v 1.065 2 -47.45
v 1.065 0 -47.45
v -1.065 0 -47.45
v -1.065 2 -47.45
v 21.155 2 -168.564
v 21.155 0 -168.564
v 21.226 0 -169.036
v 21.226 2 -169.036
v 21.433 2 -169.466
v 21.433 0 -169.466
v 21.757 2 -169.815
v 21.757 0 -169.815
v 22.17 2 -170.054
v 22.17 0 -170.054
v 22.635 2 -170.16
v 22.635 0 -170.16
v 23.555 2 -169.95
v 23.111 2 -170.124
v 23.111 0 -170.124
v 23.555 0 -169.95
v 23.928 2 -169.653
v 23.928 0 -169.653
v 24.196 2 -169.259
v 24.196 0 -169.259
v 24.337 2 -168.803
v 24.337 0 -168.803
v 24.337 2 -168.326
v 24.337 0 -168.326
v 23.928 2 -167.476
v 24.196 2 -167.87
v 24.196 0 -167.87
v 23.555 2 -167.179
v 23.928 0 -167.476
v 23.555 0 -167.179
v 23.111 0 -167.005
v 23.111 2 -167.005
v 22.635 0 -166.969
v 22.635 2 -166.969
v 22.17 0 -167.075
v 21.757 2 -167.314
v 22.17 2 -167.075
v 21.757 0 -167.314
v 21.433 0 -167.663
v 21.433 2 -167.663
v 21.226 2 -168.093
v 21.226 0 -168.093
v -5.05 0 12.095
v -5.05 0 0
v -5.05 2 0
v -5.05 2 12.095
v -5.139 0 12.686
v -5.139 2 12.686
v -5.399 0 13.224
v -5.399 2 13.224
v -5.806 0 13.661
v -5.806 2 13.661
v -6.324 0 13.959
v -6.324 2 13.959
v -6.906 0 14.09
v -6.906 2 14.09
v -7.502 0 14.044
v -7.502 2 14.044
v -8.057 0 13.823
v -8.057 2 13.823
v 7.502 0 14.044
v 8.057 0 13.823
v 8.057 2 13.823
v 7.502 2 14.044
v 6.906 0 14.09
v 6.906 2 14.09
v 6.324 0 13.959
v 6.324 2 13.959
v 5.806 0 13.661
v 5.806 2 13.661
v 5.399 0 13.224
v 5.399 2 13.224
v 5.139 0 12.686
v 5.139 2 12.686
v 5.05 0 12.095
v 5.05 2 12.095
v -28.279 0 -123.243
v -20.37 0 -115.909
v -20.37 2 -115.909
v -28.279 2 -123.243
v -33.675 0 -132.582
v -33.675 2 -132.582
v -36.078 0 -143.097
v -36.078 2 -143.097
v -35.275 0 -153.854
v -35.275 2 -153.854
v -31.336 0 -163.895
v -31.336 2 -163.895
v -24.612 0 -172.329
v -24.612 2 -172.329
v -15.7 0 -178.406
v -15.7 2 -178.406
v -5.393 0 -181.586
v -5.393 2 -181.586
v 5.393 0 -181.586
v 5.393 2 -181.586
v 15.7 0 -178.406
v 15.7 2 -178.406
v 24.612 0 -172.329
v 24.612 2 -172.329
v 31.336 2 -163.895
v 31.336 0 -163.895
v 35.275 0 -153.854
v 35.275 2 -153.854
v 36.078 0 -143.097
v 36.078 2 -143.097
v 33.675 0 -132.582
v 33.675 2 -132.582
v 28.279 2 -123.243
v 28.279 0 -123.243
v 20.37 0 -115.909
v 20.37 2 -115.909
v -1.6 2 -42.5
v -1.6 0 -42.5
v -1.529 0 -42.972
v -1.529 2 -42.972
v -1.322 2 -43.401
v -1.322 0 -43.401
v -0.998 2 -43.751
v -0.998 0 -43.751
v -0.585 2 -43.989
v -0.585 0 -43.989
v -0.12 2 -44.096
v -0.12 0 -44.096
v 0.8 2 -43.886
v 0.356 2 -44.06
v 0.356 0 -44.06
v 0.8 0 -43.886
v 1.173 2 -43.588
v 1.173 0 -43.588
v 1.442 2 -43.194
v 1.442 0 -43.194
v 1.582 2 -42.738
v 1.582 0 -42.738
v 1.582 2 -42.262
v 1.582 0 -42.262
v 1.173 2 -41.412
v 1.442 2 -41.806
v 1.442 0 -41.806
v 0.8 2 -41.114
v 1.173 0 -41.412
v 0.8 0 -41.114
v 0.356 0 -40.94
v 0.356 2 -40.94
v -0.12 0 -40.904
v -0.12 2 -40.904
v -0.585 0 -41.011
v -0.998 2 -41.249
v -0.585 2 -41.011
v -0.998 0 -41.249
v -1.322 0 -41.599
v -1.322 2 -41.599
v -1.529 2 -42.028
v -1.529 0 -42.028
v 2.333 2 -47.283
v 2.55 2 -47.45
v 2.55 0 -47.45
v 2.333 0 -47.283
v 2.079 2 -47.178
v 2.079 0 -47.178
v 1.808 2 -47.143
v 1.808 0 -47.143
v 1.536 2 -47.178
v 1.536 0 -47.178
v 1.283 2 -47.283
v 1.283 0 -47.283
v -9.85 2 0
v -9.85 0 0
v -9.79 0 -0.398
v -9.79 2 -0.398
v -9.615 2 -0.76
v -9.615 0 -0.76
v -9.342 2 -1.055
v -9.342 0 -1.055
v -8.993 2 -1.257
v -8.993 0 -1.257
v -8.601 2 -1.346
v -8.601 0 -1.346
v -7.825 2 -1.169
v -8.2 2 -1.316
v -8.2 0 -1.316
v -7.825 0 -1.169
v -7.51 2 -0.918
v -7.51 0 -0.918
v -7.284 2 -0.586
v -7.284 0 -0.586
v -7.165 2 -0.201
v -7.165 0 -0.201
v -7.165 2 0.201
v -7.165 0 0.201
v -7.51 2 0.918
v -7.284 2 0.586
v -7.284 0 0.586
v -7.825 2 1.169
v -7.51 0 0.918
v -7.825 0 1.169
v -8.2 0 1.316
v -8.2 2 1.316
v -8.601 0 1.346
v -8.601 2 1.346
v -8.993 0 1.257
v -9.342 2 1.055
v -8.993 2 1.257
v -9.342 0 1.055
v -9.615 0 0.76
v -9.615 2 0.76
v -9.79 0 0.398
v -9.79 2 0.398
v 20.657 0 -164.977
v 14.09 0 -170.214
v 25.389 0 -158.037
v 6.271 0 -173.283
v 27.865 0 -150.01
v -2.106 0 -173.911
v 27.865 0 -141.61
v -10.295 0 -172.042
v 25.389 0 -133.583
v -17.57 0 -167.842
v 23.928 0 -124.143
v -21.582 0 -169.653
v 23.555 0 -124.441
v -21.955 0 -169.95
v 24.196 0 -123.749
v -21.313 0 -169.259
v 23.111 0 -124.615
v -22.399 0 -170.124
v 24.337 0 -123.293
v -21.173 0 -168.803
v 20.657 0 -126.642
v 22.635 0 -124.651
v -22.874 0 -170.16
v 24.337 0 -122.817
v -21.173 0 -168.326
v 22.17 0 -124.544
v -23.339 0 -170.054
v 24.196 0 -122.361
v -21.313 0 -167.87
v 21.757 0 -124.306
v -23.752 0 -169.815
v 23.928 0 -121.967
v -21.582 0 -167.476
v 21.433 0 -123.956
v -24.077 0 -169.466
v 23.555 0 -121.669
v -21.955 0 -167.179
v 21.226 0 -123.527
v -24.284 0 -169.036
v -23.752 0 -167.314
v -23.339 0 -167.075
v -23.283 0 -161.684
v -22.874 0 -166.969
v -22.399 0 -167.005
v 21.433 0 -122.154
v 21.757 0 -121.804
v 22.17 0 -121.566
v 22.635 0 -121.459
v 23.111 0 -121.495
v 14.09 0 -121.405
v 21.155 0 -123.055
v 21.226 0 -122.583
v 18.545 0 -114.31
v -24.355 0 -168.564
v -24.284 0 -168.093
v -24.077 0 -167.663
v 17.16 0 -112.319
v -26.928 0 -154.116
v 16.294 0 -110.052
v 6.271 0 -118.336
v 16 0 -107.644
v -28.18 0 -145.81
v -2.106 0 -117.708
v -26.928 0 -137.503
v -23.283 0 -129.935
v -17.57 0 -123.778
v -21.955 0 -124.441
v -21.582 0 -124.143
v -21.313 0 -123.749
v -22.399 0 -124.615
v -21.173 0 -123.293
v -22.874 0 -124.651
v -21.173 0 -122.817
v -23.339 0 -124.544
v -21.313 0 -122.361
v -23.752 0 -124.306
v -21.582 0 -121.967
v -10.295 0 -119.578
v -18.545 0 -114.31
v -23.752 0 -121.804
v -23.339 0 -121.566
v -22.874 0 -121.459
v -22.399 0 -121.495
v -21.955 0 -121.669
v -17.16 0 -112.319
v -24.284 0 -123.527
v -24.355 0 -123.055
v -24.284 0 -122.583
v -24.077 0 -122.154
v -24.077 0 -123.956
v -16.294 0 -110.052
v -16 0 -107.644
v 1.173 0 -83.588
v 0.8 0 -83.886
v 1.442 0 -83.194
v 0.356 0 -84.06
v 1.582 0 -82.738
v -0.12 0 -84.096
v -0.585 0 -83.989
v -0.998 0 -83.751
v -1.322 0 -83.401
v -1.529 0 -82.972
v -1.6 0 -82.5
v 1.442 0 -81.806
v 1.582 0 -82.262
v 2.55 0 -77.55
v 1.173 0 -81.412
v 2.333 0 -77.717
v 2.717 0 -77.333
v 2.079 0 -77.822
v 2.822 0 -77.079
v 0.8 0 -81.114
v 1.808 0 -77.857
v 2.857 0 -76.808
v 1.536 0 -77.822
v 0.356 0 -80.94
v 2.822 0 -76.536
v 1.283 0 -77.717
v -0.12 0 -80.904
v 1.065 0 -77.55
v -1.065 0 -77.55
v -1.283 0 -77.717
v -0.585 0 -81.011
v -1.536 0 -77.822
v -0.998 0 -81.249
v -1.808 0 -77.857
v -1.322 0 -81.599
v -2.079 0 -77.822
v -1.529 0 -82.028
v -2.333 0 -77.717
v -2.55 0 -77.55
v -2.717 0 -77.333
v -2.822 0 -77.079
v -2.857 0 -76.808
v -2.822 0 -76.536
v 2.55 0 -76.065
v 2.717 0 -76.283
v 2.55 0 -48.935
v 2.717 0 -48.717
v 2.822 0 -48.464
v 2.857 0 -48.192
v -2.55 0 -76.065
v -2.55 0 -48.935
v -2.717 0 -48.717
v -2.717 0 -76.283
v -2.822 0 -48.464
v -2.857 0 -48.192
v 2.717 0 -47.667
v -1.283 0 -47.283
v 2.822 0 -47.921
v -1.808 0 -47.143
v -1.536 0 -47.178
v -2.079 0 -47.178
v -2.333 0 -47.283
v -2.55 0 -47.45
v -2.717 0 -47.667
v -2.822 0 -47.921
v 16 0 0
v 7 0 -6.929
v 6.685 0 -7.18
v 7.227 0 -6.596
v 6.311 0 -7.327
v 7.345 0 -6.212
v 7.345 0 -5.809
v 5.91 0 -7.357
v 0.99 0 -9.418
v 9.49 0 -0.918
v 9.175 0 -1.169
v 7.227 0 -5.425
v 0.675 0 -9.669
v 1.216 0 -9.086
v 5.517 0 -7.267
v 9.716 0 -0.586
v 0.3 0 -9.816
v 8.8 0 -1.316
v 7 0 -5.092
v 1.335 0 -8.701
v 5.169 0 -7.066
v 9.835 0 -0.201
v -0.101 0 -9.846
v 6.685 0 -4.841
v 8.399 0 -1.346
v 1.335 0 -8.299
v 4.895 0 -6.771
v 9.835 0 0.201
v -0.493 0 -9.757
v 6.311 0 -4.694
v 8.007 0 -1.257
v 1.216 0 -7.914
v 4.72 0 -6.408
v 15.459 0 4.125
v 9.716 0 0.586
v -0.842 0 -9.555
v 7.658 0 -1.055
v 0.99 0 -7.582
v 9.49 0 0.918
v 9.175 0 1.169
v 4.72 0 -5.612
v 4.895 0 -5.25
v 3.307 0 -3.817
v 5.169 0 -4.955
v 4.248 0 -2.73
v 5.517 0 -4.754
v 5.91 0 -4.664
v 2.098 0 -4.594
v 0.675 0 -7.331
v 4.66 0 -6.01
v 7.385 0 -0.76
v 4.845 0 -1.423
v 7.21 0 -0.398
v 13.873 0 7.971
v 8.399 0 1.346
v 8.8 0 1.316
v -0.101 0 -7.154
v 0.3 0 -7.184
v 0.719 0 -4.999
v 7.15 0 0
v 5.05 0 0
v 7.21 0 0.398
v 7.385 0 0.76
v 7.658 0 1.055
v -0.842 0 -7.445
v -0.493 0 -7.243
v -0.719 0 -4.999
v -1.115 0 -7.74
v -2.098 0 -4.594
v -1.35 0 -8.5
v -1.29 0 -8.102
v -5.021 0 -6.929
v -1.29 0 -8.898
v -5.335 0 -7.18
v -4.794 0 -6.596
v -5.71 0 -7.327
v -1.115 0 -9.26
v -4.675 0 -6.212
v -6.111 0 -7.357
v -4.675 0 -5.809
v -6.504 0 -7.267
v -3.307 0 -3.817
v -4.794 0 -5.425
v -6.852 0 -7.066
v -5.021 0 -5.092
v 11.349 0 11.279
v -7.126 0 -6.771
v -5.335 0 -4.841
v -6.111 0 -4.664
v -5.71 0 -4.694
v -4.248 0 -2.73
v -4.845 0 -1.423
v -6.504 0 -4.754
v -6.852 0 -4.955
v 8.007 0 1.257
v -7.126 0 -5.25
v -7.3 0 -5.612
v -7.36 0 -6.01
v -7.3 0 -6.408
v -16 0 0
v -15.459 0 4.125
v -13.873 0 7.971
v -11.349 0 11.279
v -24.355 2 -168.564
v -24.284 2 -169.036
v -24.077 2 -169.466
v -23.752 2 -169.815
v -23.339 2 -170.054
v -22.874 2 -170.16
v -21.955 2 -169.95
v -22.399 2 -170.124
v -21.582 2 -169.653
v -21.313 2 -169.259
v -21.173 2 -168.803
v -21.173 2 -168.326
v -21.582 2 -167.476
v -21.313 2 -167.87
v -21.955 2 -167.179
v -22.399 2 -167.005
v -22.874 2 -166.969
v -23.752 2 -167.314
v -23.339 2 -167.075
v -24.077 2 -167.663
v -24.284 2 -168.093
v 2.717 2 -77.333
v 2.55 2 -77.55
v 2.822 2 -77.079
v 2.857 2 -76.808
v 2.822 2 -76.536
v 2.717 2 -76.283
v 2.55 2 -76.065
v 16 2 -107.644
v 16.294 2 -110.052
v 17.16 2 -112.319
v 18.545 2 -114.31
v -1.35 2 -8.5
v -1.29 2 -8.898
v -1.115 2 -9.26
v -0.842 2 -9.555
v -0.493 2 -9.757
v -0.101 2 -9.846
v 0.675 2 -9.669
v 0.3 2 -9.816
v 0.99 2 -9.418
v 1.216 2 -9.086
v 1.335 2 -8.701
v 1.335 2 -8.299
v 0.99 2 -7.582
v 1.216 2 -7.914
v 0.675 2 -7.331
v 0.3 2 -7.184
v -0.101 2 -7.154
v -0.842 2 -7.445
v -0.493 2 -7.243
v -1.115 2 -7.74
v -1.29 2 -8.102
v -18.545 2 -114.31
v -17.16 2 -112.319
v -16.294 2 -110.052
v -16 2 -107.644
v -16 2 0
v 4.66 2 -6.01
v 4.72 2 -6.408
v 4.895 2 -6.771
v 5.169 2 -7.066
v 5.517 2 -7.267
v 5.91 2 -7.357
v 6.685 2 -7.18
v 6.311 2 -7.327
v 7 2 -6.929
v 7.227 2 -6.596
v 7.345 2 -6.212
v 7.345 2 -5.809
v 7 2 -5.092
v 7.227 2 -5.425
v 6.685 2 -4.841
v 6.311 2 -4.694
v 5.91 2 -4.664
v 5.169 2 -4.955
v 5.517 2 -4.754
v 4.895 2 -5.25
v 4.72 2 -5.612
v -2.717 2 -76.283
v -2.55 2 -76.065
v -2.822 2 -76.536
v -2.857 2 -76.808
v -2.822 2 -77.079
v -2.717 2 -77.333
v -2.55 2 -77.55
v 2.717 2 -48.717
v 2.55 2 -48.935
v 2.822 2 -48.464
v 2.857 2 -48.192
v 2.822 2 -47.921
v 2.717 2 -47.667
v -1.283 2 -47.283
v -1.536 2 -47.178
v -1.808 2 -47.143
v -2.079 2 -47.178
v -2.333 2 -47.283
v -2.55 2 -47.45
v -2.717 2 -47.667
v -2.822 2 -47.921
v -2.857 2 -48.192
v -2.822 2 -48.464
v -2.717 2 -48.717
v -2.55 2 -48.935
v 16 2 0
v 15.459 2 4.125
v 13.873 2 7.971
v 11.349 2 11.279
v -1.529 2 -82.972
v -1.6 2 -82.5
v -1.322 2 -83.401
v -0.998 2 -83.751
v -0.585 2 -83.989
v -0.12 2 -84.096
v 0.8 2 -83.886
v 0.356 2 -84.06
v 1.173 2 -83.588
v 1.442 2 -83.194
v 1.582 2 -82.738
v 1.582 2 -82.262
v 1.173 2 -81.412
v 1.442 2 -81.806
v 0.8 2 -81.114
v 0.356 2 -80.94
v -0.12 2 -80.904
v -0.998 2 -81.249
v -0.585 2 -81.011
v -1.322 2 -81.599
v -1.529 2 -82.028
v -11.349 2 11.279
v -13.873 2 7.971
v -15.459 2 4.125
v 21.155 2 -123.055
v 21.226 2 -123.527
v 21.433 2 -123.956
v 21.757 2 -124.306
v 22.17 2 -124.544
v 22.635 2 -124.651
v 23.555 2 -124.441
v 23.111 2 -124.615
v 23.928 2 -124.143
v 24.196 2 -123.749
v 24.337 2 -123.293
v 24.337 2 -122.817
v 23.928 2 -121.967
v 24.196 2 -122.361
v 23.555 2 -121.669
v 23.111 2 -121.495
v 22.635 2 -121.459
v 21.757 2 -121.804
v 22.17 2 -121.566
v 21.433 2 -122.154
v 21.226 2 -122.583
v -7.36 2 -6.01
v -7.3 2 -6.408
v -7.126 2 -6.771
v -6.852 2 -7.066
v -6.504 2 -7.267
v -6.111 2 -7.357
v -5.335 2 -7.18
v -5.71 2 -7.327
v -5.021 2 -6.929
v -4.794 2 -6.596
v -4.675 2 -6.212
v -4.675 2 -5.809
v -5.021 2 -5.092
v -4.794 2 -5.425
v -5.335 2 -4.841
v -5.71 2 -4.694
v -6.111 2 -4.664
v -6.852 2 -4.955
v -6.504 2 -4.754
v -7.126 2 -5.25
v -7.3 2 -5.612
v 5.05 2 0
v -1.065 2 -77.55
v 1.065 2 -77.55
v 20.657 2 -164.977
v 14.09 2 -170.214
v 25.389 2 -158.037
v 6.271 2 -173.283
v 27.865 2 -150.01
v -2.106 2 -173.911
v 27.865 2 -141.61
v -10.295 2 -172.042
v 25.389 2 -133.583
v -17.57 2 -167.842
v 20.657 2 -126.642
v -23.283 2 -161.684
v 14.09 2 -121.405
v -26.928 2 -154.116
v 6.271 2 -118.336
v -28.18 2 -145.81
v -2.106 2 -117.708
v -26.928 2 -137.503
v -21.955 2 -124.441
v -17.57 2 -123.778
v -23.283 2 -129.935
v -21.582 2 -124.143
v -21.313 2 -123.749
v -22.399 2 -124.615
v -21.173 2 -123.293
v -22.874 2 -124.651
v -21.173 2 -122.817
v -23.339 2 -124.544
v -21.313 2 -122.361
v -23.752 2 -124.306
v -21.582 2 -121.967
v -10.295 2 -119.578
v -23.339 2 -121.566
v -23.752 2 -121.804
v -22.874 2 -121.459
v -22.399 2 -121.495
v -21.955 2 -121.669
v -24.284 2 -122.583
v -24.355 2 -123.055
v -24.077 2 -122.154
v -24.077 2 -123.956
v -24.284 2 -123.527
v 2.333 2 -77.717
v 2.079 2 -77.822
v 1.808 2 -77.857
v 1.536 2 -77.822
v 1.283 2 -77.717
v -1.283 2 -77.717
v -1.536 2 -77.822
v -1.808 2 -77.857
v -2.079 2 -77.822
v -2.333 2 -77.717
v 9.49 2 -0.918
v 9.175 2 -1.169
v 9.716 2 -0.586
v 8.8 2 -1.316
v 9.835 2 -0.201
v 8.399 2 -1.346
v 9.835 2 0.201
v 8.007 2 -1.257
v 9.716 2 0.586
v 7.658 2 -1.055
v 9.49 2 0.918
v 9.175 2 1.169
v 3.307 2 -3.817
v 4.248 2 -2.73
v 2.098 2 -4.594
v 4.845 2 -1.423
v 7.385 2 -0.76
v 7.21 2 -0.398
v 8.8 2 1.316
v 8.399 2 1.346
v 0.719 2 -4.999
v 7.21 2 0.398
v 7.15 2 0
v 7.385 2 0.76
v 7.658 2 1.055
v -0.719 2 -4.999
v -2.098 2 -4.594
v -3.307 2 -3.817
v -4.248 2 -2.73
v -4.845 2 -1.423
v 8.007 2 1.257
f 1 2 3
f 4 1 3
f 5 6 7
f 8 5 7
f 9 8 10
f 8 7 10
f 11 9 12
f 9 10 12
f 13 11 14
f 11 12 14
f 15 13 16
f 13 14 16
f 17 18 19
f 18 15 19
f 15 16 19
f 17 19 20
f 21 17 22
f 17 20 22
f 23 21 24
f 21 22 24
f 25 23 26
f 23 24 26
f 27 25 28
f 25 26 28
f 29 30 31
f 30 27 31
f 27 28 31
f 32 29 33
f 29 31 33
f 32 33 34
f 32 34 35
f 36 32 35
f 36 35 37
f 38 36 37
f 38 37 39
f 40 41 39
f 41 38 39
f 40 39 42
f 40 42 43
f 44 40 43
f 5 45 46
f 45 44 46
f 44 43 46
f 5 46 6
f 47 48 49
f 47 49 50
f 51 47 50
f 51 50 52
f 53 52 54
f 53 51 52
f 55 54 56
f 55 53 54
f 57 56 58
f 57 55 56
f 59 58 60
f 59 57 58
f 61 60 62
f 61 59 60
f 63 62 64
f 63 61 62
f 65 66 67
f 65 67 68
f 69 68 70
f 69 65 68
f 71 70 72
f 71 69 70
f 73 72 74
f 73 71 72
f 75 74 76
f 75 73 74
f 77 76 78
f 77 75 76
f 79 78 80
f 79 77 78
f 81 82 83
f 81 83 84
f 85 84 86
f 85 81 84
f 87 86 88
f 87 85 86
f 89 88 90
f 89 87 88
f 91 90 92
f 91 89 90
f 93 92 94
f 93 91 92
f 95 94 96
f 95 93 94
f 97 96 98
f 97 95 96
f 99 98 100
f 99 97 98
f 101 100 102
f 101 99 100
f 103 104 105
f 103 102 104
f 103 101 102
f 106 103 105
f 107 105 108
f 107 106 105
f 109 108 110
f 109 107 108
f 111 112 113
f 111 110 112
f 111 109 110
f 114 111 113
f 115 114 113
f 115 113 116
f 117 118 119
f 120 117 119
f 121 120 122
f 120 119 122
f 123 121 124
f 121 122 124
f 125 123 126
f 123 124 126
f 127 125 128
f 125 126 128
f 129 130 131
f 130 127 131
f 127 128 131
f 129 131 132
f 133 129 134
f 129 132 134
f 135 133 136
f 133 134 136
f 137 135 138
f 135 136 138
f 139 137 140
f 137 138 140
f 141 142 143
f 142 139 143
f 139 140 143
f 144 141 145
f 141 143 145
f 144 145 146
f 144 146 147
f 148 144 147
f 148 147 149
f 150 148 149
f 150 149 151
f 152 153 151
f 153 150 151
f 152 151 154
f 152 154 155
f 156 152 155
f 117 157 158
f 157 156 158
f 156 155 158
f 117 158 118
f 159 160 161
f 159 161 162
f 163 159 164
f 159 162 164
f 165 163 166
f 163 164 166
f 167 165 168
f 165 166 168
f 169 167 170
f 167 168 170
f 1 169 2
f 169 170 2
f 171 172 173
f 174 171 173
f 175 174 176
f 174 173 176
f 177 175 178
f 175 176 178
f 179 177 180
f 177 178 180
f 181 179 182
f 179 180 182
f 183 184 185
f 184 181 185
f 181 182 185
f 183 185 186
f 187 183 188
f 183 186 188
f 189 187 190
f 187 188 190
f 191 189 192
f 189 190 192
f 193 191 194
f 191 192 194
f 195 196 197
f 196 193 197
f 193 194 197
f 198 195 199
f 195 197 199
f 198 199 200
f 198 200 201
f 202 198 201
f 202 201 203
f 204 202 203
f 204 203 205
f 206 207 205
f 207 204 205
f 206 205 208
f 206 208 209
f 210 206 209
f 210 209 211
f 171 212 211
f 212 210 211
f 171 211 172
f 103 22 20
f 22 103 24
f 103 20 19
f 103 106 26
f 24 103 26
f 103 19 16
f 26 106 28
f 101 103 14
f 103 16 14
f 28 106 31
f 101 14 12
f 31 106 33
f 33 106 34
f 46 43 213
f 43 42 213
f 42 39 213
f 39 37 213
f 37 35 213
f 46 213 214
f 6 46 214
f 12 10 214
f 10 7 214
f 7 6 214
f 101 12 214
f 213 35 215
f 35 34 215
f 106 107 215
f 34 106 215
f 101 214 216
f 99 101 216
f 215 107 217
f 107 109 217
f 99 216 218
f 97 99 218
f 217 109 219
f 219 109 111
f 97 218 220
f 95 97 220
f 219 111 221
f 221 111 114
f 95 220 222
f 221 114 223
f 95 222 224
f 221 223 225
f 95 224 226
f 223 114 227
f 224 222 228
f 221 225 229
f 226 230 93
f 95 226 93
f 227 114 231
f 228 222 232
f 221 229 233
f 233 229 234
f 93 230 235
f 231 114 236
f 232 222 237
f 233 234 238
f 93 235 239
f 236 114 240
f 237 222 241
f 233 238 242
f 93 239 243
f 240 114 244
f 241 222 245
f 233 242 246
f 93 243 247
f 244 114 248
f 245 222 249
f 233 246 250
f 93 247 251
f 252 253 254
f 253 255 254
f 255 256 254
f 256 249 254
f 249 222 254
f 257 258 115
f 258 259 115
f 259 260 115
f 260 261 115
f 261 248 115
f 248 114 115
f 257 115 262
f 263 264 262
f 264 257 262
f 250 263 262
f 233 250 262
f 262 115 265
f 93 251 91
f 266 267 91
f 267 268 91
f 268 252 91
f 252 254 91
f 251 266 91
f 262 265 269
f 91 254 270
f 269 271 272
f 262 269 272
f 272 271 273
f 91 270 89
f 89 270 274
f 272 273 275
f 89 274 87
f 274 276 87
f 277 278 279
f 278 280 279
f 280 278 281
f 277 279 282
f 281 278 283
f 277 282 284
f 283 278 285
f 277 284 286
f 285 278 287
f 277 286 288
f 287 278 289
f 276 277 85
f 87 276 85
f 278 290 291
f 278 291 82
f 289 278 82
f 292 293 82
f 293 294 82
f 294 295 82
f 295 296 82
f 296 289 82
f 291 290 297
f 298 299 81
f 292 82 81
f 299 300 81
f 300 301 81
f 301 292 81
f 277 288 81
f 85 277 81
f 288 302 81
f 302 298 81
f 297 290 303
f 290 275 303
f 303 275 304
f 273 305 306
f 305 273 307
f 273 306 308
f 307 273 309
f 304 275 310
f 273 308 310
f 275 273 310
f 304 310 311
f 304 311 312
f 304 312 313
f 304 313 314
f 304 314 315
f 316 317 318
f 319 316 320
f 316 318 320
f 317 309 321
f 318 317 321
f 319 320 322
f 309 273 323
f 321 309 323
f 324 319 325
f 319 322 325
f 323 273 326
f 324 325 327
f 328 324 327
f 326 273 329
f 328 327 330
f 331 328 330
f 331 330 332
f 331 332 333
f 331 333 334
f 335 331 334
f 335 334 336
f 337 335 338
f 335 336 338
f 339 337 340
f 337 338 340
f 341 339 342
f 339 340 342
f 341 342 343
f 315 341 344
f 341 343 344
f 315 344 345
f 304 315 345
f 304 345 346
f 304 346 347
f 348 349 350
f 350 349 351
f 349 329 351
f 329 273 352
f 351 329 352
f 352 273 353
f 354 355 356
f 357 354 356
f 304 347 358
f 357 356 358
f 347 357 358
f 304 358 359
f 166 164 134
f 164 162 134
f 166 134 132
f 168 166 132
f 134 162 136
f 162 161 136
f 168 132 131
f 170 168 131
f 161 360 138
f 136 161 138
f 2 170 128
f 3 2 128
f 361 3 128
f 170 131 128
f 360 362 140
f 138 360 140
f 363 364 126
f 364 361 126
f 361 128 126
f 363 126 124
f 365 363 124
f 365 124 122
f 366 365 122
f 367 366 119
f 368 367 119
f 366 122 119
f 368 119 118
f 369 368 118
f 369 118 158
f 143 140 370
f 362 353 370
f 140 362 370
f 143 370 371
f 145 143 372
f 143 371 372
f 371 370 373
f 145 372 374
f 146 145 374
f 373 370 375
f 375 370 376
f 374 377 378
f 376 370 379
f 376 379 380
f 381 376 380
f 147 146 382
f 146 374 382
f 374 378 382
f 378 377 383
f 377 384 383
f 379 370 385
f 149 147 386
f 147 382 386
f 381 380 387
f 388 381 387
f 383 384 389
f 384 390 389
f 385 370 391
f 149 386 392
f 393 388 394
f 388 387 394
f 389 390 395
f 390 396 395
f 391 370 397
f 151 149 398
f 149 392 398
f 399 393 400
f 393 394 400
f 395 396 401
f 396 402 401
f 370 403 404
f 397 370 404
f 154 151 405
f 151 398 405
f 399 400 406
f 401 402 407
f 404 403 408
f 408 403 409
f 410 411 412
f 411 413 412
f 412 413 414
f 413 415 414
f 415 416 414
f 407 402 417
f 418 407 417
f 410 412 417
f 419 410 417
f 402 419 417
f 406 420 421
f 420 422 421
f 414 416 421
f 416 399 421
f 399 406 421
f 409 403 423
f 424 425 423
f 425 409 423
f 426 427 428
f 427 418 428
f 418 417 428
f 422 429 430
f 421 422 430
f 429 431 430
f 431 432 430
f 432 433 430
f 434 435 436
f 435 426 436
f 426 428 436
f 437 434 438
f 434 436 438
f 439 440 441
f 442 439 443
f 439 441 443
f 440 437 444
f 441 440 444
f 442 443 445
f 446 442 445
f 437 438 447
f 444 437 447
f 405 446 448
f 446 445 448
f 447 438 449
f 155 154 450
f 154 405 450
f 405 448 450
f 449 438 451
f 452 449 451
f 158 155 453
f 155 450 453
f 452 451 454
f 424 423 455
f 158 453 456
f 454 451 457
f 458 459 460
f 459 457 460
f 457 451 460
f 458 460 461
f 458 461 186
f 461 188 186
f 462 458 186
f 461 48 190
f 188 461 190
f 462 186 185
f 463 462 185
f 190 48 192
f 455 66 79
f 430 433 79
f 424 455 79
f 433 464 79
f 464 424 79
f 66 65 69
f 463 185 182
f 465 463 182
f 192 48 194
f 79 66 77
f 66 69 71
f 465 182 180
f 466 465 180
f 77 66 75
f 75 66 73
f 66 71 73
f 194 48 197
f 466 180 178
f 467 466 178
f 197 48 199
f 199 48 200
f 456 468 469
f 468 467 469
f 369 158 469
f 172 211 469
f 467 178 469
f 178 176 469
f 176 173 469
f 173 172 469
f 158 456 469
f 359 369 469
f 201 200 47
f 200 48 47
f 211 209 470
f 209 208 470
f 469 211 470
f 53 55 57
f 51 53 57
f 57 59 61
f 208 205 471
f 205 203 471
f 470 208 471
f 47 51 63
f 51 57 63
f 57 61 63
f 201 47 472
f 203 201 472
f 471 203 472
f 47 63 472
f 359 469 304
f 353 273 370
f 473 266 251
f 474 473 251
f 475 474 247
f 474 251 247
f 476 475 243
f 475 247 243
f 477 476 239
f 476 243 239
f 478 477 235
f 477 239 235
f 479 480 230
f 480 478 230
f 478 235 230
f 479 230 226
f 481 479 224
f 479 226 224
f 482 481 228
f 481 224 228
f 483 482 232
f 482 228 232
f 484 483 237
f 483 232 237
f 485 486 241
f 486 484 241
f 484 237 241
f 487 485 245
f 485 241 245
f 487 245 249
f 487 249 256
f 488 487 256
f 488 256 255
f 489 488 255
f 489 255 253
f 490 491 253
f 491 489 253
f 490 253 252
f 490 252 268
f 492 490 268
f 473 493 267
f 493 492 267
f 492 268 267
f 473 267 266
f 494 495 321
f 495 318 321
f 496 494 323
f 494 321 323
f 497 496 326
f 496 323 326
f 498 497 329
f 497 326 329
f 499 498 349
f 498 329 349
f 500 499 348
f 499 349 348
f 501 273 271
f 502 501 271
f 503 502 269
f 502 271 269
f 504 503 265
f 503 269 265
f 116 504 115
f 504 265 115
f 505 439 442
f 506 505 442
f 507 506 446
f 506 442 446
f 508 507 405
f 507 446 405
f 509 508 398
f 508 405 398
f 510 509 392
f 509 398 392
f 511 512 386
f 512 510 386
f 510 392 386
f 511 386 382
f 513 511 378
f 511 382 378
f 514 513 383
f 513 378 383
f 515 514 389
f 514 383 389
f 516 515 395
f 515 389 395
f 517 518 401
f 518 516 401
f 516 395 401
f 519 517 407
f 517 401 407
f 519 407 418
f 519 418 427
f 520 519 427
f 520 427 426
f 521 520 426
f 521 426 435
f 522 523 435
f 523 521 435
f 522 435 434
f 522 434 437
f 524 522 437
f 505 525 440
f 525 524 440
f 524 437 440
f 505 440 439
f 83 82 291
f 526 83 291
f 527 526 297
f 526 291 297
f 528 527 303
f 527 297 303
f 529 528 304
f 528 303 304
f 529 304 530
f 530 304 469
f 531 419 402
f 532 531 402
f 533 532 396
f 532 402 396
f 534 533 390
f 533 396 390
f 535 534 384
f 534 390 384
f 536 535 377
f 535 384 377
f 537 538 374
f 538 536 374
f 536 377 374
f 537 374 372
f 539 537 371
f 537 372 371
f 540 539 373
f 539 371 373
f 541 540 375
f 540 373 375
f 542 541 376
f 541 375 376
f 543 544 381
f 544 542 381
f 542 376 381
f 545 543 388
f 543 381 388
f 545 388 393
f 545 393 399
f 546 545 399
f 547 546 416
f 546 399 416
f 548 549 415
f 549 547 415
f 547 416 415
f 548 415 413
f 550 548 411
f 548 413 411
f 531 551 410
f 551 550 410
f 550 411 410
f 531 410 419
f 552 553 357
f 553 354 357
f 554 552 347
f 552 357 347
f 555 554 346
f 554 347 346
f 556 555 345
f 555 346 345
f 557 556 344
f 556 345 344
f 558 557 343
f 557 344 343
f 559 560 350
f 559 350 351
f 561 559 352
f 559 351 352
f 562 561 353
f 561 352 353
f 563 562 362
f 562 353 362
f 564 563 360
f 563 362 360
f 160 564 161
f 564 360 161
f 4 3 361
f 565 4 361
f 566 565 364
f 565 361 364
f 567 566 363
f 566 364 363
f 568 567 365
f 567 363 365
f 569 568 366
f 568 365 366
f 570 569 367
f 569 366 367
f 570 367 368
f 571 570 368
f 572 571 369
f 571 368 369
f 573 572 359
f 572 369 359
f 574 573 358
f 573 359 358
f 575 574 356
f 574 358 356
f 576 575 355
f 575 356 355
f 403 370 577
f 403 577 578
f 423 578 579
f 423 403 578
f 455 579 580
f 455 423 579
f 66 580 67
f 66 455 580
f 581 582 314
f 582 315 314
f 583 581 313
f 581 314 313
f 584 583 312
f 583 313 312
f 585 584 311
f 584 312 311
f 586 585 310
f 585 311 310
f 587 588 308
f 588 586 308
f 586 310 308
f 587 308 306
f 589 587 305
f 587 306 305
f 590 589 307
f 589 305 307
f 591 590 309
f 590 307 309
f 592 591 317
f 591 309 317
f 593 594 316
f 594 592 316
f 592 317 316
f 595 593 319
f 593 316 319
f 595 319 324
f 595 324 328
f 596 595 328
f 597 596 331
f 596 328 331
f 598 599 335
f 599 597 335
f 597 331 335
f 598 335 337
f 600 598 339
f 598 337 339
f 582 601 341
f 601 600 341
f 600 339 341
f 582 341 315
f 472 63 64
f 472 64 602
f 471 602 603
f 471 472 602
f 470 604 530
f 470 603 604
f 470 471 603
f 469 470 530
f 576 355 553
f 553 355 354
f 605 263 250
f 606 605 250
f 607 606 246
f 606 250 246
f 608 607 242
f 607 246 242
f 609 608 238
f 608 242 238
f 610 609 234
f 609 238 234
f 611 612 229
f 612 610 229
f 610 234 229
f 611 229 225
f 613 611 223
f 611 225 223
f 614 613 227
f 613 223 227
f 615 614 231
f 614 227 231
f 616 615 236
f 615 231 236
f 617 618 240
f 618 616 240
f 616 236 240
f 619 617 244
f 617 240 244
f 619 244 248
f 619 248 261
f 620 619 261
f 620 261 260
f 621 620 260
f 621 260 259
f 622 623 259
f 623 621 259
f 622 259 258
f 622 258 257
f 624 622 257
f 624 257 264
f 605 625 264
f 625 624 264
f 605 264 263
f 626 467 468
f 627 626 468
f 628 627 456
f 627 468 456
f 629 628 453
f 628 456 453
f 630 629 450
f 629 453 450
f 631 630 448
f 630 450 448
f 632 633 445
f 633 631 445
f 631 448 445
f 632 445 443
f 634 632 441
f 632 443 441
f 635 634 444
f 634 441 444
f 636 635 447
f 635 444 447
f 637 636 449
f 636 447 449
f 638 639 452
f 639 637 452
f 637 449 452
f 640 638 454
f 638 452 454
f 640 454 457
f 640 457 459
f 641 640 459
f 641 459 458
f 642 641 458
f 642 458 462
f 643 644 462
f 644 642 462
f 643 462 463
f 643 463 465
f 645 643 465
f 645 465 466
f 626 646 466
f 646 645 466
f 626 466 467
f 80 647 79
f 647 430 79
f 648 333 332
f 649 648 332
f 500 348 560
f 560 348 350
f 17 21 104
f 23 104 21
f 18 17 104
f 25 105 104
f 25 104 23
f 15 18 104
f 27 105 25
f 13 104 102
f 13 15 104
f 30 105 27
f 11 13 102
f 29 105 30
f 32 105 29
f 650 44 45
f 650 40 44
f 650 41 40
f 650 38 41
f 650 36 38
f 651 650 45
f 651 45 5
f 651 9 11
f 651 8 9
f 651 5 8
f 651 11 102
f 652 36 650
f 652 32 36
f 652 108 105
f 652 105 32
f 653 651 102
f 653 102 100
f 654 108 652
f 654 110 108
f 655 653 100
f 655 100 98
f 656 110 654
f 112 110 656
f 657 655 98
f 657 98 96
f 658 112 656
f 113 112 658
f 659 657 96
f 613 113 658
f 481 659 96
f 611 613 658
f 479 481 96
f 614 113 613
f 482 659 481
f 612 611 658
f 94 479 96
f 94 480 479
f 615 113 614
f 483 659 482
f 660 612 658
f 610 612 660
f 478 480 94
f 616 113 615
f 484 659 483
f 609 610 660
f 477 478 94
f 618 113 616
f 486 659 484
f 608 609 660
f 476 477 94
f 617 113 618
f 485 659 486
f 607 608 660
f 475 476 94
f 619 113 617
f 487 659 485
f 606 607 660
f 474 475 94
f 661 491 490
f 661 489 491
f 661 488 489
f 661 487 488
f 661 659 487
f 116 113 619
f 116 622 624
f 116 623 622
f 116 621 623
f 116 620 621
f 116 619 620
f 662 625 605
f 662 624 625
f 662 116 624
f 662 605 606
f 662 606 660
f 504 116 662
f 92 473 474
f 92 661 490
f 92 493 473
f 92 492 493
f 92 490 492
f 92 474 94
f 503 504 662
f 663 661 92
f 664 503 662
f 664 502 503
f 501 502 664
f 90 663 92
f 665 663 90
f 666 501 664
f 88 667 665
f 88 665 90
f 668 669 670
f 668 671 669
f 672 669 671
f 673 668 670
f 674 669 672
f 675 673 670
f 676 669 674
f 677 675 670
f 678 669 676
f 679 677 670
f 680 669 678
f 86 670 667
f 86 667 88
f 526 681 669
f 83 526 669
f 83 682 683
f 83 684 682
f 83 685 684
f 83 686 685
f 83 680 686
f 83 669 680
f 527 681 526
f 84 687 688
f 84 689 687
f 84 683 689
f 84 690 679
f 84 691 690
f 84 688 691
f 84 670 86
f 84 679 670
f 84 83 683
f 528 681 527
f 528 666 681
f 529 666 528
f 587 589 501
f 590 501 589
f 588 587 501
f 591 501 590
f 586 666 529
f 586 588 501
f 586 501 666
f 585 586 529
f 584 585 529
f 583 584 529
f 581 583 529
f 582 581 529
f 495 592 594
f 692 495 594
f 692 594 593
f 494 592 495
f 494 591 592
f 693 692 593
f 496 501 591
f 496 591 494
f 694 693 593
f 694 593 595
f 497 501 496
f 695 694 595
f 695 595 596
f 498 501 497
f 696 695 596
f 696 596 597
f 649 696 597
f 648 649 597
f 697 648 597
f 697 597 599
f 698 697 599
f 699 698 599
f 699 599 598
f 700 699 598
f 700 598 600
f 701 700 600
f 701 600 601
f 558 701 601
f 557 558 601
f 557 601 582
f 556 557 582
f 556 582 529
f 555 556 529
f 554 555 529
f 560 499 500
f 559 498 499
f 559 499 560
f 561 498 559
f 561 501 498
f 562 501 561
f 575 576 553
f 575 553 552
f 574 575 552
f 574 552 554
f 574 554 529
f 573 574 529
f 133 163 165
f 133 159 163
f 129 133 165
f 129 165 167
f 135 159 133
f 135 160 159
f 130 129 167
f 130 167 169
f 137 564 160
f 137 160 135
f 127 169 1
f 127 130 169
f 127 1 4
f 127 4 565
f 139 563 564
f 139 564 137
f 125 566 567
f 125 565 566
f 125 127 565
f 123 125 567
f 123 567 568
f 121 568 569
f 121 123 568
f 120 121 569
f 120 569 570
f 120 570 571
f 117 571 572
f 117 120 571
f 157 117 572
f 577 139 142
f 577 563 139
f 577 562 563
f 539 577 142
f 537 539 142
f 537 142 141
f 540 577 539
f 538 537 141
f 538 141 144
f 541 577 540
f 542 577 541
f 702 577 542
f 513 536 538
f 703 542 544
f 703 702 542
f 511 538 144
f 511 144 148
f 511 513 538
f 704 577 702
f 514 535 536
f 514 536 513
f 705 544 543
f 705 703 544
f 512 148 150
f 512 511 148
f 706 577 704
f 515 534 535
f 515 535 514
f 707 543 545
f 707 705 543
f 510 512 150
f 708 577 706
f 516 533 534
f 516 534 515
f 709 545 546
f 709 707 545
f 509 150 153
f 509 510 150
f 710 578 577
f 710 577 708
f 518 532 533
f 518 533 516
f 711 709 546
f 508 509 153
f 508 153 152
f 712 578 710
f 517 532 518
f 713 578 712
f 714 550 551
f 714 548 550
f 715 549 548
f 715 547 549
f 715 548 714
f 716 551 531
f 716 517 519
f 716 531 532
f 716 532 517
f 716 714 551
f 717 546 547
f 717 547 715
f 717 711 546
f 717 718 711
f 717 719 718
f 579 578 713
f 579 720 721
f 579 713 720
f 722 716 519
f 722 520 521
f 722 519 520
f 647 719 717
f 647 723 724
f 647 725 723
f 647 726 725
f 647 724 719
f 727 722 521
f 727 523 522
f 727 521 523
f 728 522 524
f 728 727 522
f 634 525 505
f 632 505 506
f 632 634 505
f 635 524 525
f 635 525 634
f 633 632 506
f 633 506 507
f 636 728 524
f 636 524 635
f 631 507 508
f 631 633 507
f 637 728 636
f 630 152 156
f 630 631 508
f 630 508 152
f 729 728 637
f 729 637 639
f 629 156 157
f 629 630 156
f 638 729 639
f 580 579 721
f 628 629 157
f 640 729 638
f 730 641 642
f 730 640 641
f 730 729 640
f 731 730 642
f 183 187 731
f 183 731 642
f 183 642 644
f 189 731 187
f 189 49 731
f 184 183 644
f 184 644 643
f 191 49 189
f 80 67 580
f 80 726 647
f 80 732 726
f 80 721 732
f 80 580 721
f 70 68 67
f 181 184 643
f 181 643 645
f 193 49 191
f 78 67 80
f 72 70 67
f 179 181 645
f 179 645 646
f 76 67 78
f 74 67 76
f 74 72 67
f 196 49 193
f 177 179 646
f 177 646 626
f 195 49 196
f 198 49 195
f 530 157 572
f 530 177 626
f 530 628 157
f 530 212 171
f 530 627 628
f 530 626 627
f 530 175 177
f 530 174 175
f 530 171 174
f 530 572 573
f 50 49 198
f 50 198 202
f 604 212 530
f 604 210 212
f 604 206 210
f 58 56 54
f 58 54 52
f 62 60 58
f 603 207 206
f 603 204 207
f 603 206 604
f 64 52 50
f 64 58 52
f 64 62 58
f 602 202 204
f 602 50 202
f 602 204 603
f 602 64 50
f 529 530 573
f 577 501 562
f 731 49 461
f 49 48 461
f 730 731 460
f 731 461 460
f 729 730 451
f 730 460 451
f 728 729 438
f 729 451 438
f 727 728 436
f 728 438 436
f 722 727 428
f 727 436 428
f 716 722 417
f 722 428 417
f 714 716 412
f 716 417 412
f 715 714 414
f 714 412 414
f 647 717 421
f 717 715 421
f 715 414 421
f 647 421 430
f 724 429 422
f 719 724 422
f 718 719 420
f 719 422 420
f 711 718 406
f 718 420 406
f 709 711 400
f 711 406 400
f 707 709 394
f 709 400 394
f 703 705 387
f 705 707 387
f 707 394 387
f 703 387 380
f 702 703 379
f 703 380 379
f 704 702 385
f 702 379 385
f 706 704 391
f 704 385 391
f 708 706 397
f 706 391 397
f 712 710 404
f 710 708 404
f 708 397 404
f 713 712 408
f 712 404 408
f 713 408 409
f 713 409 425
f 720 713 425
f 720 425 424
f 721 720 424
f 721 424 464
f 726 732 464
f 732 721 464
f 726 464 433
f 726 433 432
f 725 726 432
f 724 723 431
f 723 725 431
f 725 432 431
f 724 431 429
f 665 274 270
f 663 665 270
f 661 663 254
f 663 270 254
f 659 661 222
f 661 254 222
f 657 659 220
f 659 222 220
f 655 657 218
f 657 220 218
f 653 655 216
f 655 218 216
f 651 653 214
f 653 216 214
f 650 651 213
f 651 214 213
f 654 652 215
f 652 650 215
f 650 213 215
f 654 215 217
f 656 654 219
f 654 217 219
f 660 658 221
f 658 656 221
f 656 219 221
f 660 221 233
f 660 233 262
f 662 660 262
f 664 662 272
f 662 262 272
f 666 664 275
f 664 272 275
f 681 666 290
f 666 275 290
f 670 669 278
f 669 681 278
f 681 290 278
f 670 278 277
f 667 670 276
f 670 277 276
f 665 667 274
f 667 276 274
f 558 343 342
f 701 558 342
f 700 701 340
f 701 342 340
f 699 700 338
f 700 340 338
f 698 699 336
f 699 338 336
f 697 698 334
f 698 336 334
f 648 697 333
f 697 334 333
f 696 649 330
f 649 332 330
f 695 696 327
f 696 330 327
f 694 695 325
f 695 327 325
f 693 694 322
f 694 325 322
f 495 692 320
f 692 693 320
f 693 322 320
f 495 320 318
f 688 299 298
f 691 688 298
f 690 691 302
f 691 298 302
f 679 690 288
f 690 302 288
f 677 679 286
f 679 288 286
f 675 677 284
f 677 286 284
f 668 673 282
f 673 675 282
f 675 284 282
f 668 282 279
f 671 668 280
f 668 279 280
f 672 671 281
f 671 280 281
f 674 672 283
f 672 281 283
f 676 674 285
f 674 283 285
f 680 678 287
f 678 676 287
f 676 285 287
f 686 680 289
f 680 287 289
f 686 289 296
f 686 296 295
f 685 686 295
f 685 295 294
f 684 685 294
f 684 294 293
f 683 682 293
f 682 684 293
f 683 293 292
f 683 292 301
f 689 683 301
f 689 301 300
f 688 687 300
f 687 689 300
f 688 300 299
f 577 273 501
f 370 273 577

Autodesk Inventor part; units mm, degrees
ref_plane "YZ Plane" through (0, 0, 0) normal (1, 0, 0) x (0, 1, 0)
ref_plane "XZ Plane" through (0, 0, 0) normal (0, 1, 0) x (-1, 0, 0)
ref_plane "XY Plane" through (0, 0, 0) normal (0, 0, 1) x (1, 0, 0)
sketch "スケッチ1" plane through (0, 0, 0) normal (0, 1, 0) x (-1, 0, 0)
  circle A0 centre (0, 0) radius 5.05
  line L0 (-8.5, 0) -> (8.5, 0) construction
  circle A1 centre (-8.5, 0) radius 1.35
  circle A2 centre (-6.0104, -6.0104) radius 1.35
  circle A3 centre (0, -8.5) radius 1.35
  circle A4 centre (6.0104, -6.0104) radius 1.35
  circle A5 centre (0, -145.8097) radius 16 construction
  line L1 (0, 0) -> (0, -145.8097) construction
  arc A6 (-20.3699, -115.9088) -> (20.3699, -115.9088) centre (0, -145.8097) ccw
  circle A7 centre (-8.5, 0) radius 2.4 construction
  line L2 (-16, 31) -> (16, 31) construction
  line L3 (16, 31) -> (16, -12) construction
  line L4 (16, -12) -> (-16, -12) construction
  line L5 (-16, -12) -> (-16, 31) construction
  line L6 (-16, 31) -> (16, -12) construction
  line L7 (16, 31) -> (-16, -12) construction
  arc A8 (-16, 0) -> (-10.583, -12) centre (0, 0) ccw construction
  arc A9 (10.583, -12) -> (16, 0) centre (0, 0) ccw construction
  line L8 (-16, -107.6443) -> (-16, 0)
  line L9 (16, -107.6443) -> (16, 0)
  circle A10 centre (0, -82.5) radius 1.6
  line L10 (0, -145.8097) -> (-25.5832, -120.2265) construction
  circle A11 centre (-22.7548, -123.055) radius 4 construction
  circle A12 centre (-22.7548, -123.055) radius 1.6
  circle A13 centre (-22.7548, -168.5645) radius 1.6
  circle A14 centre (22.7548, -168.5645) radius 1.6
  circle A15 centre (22.7548, -123.055) radius 1.6
  line L11 (30.6064, -21.0119) -> (2.8936, -37.0119) construction
  line L12 (2.8936, -37.0119) -> (-18.6064, 0.2272) construction
  line L13 (-18.6064, 0.2272) -> (9.1064, 16.2272) construction
  line L14 (9.1064, 16.2272) -> (30.6064, -21.0119) construction
  line L15 (30.6064, -21.0119) -> (-18.6064, 0.2272) construction
  line L16 (2.8936, -37.0119) -> (9.1064, 16.2272) construction
  line L17 (16.75, -29.0119) -> (-4.75, 8.2272) construction
  circle A16 centre (0, -42.5) radius 1.6
  line L18 (-2.5, -47.5) -> (2.5, -47.5) construction
  line L19 (2.5, -47.5) -> (2.5, -57.5) construction
  line L20 (2.5, -57.5) -> (-2.5, -57.5) construction
  line L21 (-2.5, -57.5) -> (-2.5, -47.5) construction
  line L22 (-2.5, -47.5) -> (2.5, -57.5) construction
  line L23 (2.5, -47.5) -> (-2.5, -57.5) construction
  line L24 (-2.5, -52.5) -> (2.5, -52.5) construction
  circle A17 centre (0, -62.5) radius 1.6
  line L25 (2.8936, -37.0119) -> (49.2811, -117.3573) construction
  line L26 (0, -145.8097) -> (49.2811, -117.3573) construction
  line L27 (-2.5, -47.5) -> (2.5, -47.5) construction
  line L28 (2.5, -47.5) -> (2.5, -77.5) construction
  line L29 (2.5, -77.5) -> (-2.5, -77.5) construction
  line L30 (-2.5, -77.5) -> (-2.5, -47.5) construction
  line L31 (-2.5, -47.5) -> (2.5, -77.5) construction
  line L32 (2.5, -47.5) -> (-2.5, -77.5) construction
  line L33 (-2.55, -47.45) -> (2.55, -47.45)
  line L34 (2.55, -47.45) -> (2.55, -77.55)
  line L35 (2.55, -77.55) -> (-2.55, -77.55)
  line L36 (-2.55, -77.55) -> (-2.55, -47.45)
  line L37 (-2.55, -47.45) -> (2.55, -77.55) construction
  line L38 (2.55, -47.45) -> (-2.55, -77.55) construction
  arc A18 (-1.0651, -47.45) -> (-2.55, -48.9349) centre (-1.8075, -48.1925) ccw
  arc A19 (2.55, -48.9349) -> (1.0651, -47.45) centre (1.8075, -48.1925) ccw
  line L39 (-2.5, -62.5) -> (2.5, -62.5) construction
  arc A20 (-2.55, -76.0651) -> (-1.0651, -77.55) centre (-1.8075, -76.8075) ccw
  arc A21 (1.0651, -77.55) -> (2.55, -76.0651) centre (1.8075, -76.8075) ccw
  arc A22 (16, 0) -> (8.0571, 13.8233) centre (0, 0) ccw
  circle A23 centre (0, -145.8097) radius 28.1801
  line L40 (-5.05, 0) -> (-5.05, 12.0954)
  line L41 (5.05, 0) -> (5.05, 12.0954)
  circle A24 centre (8.5, 0) radius 1.35
  arc A25 (-8.0571, 13.8233) -> (-16, 0) centre (0, 0) ccw
  arc A26 (-5.05, 12.0954) -> (-8.0571, 13.8233) centre (-7.05, 12.0954) ccw
  arc A27 (8.0571, 13.8233) -> (5.05, 12.0954) centre (7.05, 12.0954) ccw
  arc A28 (-20.3699, -115.9088) -> (-16, -107.6443) centre (-26, -107.6443) ccw
  arc A29 (16, -107.6443) -> (20.3699, -115.9088) centre (26, -107.6443) ccw
  point P0 (0, 9.5)
  point P1 (0, 9.5)
  point P2 (-16, -113.3598)
  point P3 (16, -113.3598)
  point P4 (6, -10.3923)
  point P5 (0, -52.5)
  point P6 (0, -62.5)
  point P7 (1.0651, -77.55)
  point P8 (-1.0651, -77.55)
  point P9 (-2.55, -76.0651)
  point P10 (2.55, -48.9349)
  point P11 (2.55, -76.0651)
  point P12 (0, -181.9899)
  point P13 (-5.05, 15.1821)
  point P14 (5.05, 15.1821)
  point P15 (5.05, 9.6596)
  point P16 (5.05, 0)
  dimension "d0" = 10.1
  dimension "d1" = 17
  dimension "d2" = 2.7
  dimension "d5" = 180
  dimension "d7" = 32
  dimension "d8" = 145.8098
  dimension "d9" = 72.3602
  dimension "d10" = 4.8
  dimension "d11" = 32
  dimension "d12" = 43
  dimension "d14" = 9.5
  dimension "d17" = 3.2
  dimension "d23" = 32
  dimension "d24" = 45
  dimension "d25" = 8
  dimension "d26" = 3.2
  dimension "d29" = 360
  dimension "d33" = 32
  dimension "d34" = 43
  dimension "d36" = 9.5
  dimension "d37" = 150
  dimension "d38" = 3.2
  dimension "d40" = 5
  dimension "d41" = 10
  dimension "d42" = 40
  dimension "d43" = 20
  dimension "d44" = 42.5
  dimension "d45" = 30
  dimension "d46" = 1.05
  dimension "d47" = 0.05
  dimension "d48" = 0.05
  dimension "d49" = 16
  dimension "d50" = 181.9898
  dimension "d53" = 90
  dimension "d54" = 2
  dimension "d55" = 10
extrude "押し出し1" add sketch "スケッチ1" along normal blind 2 contours L41 A27 A22 L9 A29 A6 A28 L8 A25 A26 L40 A0
equation "\"d36\" = d14"
properties part number "ForeArm_outside_frame" material "GFRP"
